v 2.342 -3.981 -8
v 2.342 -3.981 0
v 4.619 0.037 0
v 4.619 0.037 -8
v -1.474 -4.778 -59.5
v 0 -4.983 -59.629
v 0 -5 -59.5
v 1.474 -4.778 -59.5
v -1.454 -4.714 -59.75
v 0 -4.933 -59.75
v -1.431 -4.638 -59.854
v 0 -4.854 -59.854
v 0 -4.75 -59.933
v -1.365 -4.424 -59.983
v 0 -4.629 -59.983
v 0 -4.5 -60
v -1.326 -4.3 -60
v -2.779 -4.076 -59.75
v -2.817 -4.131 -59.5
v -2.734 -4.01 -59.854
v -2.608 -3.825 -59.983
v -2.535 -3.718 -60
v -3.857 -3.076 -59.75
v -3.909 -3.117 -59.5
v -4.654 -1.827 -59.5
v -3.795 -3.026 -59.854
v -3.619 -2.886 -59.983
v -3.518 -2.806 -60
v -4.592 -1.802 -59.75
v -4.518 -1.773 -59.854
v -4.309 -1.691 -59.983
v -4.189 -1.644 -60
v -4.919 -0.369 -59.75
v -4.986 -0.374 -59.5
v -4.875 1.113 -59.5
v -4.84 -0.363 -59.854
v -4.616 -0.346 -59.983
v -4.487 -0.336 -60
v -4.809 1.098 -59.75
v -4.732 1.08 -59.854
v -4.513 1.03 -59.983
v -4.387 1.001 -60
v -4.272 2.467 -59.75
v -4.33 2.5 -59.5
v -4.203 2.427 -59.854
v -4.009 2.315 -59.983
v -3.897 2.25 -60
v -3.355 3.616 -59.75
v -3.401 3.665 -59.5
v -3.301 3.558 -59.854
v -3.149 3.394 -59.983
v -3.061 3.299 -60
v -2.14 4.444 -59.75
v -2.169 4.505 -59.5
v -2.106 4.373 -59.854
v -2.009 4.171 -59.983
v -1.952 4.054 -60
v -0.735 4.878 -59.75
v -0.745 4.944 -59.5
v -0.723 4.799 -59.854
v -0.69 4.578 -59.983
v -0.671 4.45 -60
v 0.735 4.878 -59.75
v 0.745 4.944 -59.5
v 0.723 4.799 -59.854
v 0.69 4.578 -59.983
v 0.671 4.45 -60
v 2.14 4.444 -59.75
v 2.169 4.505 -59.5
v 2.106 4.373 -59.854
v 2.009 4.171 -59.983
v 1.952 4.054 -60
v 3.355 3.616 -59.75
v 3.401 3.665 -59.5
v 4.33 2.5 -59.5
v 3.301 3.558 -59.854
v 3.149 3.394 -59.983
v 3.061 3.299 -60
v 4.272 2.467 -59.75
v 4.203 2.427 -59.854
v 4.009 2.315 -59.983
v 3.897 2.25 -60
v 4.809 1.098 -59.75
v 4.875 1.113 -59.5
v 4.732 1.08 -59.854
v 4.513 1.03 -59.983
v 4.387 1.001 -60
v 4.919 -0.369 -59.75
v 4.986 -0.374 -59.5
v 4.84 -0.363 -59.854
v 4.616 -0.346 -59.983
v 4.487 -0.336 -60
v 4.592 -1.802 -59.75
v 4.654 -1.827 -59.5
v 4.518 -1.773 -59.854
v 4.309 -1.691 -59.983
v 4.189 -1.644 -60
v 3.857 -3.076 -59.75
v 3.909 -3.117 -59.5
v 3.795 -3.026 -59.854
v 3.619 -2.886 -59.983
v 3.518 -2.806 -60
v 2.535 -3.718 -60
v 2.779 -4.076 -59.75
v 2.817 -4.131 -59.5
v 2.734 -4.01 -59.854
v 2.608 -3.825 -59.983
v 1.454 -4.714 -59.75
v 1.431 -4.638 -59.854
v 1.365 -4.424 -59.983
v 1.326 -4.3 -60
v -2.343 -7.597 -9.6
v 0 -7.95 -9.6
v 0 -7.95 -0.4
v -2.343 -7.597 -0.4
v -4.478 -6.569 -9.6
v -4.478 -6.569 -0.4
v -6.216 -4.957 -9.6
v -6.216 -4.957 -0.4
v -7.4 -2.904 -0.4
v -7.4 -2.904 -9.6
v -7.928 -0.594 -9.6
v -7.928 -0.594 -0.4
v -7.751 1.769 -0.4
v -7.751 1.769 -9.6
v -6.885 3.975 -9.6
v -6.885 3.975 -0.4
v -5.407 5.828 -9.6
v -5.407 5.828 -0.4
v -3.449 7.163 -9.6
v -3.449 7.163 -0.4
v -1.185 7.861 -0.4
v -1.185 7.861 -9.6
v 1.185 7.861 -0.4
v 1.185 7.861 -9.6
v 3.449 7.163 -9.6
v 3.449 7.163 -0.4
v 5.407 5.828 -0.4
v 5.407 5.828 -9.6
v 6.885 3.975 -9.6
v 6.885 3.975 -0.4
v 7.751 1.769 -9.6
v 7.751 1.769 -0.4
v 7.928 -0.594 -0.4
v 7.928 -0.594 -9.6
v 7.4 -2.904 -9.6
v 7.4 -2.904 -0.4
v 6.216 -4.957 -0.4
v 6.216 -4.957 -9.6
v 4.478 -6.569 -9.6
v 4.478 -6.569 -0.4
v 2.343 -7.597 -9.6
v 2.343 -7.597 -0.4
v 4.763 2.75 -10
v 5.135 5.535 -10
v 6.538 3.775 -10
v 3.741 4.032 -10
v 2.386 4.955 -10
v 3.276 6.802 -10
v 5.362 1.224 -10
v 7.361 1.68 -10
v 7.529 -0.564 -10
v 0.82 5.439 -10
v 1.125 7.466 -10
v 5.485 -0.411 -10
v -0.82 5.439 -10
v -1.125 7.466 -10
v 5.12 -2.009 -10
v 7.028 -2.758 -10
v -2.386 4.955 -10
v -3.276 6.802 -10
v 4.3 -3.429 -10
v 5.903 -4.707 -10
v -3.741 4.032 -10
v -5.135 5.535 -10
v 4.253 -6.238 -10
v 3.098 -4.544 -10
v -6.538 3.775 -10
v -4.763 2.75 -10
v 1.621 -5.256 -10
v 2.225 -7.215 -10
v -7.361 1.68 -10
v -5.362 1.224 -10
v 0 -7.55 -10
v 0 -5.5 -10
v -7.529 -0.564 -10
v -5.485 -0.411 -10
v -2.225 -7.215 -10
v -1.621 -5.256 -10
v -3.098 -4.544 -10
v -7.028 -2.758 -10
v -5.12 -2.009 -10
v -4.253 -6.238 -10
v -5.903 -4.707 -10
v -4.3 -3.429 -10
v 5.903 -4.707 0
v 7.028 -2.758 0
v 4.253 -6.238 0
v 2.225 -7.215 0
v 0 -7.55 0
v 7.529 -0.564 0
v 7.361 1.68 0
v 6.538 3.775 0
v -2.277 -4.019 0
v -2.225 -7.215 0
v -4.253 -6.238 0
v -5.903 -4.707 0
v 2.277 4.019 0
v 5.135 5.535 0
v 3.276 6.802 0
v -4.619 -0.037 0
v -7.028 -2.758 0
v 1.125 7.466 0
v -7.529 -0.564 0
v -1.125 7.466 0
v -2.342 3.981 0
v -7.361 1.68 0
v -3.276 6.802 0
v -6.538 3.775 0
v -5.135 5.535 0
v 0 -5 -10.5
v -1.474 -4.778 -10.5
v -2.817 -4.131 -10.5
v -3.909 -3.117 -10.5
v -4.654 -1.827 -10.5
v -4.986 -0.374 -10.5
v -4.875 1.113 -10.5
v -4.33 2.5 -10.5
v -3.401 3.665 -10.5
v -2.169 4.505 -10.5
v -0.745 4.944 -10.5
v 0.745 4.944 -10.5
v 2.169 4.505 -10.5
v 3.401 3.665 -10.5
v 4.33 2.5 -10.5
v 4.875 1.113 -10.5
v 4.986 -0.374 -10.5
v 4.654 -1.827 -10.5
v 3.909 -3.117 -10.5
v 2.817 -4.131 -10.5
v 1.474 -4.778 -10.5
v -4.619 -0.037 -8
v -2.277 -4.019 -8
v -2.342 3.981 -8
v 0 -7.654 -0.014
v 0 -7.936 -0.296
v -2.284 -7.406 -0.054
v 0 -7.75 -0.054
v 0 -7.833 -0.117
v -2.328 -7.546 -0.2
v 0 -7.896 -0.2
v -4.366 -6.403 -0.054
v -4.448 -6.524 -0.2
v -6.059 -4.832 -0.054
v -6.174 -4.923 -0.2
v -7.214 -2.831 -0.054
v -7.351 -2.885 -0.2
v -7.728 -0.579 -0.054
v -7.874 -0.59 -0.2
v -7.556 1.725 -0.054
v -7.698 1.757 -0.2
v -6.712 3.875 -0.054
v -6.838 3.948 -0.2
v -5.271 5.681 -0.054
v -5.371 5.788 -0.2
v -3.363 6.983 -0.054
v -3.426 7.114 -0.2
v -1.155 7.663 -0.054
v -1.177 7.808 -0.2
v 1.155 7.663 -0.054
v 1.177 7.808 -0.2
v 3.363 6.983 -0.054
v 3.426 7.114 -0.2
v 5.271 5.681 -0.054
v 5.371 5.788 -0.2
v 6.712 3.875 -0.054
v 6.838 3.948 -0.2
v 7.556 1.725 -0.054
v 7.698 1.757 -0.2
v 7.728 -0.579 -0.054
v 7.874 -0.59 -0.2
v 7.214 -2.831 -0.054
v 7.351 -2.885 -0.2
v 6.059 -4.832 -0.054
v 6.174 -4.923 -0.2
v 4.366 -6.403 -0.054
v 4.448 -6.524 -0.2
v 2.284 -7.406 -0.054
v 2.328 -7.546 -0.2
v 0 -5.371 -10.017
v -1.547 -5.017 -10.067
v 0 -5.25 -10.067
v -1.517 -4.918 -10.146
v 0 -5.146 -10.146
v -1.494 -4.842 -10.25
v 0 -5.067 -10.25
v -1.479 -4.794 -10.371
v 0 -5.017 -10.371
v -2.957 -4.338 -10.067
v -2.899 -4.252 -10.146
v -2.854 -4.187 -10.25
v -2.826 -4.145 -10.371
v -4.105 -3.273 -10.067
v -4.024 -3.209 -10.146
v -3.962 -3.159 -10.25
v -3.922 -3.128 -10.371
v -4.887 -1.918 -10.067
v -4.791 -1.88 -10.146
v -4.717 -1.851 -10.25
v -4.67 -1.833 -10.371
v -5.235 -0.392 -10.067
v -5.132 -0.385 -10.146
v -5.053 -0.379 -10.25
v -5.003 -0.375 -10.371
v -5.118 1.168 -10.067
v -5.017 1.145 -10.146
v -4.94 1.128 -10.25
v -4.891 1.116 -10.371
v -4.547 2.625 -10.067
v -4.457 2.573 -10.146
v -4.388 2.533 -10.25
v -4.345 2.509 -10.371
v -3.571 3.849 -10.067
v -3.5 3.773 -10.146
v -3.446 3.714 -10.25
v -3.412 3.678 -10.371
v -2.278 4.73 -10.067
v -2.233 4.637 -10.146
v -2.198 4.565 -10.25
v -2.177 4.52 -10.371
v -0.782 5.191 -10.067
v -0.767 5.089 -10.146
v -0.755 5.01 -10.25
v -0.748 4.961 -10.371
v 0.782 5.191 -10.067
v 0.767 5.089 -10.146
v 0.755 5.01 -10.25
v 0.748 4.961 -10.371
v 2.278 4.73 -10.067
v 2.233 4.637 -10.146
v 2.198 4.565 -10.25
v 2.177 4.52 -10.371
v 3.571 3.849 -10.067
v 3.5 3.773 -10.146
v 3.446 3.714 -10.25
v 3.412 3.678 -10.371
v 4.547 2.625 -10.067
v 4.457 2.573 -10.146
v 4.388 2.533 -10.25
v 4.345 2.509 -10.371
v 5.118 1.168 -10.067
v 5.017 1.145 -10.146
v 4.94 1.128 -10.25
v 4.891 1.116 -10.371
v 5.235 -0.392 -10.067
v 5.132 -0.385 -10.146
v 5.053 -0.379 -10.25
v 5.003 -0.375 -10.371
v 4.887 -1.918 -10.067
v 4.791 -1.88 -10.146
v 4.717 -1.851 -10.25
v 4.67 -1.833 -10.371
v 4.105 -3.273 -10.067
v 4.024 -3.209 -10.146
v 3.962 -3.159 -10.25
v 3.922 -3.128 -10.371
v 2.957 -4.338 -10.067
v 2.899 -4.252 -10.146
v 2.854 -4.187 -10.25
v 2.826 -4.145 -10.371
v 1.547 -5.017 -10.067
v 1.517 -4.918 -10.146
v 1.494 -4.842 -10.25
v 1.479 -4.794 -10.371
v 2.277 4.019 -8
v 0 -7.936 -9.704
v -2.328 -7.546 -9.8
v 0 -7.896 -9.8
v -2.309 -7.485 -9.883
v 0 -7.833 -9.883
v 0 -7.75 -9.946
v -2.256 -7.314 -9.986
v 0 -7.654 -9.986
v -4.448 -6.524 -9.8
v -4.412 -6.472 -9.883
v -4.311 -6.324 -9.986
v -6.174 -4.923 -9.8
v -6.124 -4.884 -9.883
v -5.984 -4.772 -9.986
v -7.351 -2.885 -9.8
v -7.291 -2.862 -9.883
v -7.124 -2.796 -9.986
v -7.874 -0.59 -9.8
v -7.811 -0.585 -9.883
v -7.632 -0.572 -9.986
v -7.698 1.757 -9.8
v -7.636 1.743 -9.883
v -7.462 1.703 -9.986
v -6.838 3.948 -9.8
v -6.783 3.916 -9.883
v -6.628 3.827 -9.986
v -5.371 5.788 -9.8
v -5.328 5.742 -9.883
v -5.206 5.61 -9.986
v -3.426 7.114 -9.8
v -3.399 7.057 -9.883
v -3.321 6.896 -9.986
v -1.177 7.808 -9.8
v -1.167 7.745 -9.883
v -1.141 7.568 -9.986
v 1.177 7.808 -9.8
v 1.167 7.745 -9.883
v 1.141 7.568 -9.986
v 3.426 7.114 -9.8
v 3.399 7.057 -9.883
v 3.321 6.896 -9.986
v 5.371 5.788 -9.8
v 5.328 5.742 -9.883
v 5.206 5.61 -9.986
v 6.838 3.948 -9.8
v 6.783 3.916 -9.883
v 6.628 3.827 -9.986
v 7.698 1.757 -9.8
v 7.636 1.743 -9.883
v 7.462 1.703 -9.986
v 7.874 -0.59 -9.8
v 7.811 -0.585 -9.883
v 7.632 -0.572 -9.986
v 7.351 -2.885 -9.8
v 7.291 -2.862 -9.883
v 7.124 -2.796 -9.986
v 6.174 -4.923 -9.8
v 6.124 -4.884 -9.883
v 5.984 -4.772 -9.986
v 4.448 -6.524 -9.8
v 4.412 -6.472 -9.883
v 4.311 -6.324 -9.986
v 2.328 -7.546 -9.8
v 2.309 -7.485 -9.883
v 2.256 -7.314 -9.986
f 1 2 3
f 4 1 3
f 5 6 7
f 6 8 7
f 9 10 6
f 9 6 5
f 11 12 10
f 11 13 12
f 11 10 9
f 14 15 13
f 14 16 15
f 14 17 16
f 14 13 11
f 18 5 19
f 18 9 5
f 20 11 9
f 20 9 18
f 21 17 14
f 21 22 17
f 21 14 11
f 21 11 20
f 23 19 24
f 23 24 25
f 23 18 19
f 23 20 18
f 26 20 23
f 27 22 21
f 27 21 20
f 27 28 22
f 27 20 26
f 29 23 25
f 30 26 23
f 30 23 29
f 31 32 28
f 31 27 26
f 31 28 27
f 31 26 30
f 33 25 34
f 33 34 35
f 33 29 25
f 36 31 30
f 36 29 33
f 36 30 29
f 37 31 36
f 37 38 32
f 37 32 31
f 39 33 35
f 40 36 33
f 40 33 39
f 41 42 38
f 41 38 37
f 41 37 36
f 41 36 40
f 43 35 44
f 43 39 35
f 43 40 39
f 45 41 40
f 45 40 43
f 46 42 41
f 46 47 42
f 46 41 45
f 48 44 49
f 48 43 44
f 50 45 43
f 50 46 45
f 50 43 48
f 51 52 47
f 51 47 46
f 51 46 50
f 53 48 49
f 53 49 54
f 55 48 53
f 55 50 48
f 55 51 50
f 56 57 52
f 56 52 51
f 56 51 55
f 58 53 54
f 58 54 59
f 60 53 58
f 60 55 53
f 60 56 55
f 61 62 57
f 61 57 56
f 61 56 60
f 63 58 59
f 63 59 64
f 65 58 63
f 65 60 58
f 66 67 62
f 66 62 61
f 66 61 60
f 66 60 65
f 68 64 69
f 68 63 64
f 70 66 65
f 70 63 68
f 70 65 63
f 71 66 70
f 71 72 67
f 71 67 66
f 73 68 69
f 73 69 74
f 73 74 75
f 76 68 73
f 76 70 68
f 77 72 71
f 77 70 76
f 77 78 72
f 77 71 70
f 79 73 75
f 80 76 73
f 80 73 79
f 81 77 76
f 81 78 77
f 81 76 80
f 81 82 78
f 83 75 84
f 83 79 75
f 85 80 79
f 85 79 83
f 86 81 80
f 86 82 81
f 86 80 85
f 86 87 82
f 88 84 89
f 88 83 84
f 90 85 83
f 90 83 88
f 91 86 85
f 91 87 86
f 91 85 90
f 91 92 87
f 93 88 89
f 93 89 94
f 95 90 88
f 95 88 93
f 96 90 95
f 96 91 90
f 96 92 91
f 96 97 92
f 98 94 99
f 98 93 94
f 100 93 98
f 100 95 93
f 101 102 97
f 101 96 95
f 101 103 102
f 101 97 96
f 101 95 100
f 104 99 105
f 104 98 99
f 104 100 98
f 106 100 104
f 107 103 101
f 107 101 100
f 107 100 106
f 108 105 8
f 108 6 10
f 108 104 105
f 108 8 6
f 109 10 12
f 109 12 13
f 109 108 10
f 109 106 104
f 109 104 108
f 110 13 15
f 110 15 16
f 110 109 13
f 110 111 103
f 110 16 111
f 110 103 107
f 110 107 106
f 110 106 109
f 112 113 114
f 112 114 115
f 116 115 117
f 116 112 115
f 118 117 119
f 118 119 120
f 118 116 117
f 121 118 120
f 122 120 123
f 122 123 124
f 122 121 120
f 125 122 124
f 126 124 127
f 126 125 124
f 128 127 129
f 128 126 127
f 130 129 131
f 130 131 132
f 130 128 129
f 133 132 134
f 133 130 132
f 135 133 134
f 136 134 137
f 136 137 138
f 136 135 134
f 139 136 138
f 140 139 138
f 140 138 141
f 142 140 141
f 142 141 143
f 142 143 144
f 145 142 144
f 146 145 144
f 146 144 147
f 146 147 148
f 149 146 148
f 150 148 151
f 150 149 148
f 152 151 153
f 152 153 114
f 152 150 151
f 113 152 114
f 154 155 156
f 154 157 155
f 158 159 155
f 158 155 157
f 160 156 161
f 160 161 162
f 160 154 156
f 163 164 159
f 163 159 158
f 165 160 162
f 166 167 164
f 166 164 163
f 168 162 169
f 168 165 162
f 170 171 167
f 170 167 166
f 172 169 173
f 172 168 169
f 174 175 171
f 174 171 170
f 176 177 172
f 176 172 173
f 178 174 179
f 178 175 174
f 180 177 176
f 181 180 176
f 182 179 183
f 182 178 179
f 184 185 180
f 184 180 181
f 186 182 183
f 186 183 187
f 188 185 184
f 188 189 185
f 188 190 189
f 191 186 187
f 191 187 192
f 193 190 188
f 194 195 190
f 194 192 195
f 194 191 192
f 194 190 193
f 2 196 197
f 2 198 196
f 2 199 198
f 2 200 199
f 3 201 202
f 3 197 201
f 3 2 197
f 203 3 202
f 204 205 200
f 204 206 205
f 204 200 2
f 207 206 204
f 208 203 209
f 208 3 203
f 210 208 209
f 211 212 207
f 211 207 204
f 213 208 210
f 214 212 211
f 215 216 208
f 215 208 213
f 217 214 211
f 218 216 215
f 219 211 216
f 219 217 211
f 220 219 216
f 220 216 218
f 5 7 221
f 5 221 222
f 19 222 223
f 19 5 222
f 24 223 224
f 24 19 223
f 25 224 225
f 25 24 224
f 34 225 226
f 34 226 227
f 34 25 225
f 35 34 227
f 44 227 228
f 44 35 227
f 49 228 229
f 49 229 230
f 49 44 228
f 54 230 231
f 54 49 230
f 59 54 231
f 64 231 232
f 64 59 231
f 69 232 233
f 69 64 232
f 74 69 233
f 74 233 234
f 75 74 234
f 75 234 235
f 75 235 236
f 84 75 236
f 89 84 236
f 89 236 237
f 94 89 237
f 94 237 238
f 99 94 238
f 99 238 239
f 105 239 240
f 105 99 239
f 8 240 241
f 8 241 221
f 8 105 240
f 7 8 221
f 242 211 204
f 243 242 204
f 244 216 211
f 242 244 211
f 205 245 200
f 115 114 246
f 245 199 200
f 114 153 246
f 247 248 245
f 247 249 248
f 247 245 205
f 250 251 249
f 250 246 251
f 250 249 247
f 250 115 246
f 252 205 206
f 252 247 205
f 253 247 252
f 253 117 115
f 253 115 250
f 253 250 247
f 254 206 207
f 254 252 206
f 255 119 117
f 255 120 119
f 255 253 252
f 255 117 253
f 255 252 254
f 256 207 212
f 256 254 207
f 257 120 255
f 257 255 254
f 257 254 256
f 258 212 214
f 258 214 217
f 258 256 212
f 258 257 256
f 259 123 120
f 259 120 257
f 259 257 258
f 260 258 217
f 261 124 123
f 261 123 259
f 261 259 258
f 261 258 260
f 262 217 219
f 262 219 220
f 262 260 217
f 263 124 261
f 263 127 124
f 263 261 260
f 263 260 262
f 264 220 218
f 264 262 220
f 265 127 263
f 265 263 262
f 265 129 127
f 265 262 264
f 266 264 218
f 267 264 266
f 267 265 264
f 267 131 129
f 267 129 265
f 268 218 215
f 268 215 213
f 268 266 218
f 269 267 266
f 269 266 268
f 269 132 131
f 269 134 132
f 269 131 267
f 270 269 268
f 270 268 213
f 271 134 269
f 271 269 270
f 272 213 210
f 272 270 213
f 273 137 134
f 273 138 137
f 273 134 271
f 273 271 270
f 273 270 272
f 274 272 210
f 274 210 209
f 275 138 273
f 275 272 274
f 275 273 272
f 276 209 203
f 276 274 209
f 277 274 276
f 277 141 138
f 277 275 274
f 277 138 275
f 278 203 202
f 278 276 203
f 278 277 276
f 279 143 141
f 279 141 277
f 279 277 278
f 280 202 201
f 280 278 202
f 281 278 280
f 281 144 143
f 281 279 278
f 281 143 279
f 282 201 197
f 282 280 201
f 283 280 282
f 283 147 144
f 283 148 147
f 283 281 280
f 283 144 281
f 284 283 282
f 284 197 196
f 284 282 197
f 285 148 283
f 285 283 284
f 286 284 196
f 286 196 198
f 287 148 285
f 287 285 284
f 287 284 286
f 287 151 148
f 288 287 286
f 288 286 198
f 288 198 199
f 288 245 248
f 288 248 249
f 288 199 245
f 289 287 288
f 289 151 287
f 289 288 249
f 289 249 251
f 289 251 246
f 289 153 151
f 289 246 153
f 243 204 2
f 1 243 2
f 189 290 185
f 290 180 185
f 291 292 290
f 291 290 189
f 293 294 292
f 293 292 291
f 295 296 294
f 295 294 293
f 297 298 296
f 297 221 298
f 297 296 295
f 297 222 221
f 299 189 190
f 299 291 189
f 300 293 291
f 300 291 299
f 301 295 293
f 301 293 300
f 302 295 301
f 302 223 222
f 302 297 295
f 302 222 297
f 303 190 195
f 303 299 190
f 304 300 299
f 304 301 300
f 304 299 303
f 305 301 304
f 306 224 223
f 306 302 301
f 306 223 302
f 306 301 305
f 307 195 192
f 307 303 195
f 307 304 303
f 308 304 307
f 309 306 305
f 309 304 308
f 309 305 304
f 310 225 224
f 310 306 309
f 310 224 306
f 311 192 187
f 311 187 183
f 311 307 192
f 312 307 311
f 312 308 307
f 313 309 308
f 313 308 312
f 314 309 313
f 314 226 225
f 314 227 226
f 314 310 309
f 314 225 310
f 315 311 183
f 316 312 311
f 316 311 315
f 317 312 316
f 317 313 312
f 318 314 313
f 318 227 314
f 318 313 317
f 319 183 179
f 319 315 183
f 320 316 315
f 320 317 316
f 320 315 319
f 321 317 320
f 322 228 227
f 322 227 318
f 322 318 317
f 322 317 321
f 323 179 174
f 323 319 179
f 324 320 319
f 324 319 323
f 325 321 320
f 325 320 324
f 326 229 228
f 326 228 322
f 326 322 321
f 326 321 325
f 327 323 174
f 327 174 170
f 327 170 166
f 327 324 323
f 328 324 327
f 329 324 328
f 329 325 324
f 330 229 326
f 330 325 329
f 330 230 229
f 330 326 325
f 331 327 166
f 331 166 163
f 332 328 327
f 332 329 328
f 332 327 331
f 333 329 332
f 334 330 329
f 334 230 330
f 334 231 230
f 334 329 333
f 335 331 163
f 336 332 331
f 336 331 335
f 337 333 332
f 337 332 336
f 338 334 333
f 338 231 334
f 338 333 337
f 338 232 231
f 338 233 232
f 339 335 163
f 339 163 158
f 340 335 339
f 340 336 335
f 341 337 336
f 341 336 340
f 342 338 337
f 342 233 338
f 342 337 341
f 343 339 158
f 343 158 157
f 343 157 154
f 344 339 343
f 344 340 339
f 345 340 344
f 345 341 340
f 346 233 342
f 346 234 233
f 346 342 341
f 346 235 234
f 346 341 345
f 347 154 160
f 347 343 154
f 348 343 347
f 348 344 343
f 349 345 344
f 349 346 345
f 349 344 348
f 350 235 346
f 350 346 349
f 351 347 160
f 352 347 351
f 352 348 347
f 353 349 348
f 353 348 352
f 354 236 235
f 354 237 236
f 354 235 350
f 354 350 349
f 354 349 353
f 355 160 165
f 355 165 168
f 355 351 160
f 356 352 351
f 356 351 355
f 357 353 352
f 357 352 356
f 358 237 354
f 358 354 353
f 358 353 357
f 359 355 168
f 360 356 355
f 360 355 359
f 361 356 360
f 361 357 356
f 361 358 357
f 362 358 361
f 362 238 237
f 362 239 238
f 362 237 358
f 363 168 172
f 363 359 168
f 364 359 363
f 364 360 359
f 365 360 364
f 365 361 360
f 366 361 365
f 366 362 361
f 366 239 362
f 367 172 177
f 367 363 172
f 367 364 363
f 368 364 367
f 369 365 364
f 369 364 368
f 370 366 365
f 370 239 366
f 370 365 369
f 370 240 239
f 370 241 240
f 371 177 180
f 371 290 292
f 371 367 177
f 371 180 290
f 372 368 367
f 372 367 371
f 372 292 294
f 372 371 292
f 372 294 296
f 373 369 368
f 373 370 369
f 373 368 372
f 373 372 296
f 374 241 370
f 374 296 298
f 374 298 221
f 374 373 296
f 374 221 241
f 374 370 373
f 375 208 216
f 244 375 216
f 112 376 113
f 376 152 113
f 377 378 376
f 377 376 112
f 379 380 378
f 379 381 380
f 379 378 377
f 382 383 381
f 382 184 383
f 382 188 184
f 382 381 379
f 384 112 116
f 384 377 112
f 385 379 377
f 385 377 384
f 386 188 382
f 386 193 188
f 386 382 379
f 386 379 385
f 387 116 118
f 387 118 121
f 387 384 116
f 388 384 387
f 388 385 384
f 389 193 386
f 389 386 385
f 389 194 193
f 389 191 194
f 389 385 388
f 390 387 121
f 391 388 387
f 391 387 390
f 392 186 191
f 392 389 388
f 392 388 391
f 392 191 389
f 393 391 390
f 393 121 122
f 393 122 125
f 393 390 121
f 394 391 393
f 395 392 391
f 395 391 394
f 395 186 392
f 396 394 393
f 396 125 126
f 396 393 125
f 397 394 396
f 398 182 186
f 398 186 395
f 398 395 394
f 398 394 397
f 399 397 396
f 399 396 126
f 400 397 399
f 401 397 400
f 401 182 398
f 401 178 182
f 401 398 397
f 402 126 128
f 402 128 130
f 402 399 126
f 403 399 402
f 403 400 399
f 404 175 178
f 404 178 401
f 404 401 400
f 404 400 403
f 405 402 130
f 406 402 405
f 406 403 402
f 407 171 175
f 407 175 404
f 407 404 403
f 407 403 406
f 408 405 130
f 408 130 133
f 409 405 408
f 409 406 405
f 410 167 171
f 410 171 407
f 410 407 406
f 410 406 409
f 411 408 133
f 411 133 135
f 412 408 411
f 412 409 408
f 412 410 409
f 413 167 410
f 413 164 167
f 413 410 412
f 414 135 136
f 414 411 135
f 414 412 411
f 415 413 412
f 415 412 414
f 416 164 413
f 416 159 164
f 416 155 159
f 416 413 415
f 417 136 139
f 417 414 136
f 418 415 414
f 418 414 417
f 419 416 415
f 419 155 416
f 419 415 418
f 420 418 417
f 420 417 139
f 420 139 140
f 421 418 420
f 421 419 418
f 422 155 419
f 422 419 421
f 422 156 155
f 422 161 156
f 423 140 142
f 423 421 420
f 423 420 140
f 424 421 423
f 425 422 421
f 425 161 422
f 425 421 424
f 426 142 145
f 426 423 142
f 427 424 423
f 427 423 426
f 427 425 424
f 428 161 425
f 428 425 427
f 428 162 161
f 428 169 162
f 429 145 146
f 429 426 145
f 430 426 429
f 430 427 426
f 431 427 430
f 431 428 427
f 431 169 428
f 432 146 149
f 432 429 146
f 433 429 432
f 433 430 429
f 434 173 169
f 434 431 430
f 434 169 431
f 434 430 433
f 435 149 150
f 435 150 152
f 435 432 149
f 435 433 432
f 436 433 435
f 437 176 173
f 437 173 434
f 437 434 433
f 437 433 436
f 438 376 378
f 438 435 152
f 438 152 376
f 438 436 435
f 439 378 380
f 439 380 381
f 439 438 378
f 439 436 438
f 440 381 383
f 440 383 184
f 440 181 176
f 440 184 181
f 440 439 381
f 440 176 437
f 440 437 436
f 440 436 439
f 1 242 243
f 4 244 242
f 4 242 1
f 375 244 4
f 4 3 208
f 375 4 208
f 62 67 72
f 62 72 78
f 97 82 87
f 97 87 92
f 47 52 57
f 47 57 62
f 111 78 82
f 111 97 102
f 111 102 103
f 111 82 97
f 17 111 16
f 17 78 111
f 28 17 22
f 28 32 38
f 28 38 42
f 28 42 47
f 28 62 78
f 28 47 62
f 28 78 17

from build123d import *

# Parameters (mm, degrees)
F3_DEPTH = 8
F4_R     = 0.4
F5_R     = 0.5


with BuildPart() as f1:
    # F0 (on Right) → F1 (revolve)
    with BuildSketch(Plane.YZ):
        Polygon((0, -60), (0, 0), (-7.95, 0), (-7.95, -10), (-5, -10), (-5, -60), align=None)
    revolve(axis=Axis((0, 0, -30), (0, 0, -1)))

    # F2 (on face) → F3 (cut)
    with BuildSketch(Plane.XY):
        Polygon((-2.341641, 3.981212), (-4.618651, -0.037314), (-2.277011, -4.018527), (2.341641, -3.981212), (4.618651, 0.037314), (2.277011, 4.018527), align=None)
    extrude(amount=-F3_DEPTH, mode=Mode.SUBTRACT)

    # F4
    f4_edges = [f1.edges().sort_by_distance(p)[0] for p in [
        (0, 7.95, 0),
        (0, 7.95, -10),
    ]]
    fillet(f4_edges, radius=F4_R)

    # F5
    f5_edges = [f1.edges().sort_by_distance(p)[0] for p in [
        (0, 5, -10),
        (0, 5, -60),
    ]]
    fillet(f5_edges, radius=F5_R)


solid = f1.part
